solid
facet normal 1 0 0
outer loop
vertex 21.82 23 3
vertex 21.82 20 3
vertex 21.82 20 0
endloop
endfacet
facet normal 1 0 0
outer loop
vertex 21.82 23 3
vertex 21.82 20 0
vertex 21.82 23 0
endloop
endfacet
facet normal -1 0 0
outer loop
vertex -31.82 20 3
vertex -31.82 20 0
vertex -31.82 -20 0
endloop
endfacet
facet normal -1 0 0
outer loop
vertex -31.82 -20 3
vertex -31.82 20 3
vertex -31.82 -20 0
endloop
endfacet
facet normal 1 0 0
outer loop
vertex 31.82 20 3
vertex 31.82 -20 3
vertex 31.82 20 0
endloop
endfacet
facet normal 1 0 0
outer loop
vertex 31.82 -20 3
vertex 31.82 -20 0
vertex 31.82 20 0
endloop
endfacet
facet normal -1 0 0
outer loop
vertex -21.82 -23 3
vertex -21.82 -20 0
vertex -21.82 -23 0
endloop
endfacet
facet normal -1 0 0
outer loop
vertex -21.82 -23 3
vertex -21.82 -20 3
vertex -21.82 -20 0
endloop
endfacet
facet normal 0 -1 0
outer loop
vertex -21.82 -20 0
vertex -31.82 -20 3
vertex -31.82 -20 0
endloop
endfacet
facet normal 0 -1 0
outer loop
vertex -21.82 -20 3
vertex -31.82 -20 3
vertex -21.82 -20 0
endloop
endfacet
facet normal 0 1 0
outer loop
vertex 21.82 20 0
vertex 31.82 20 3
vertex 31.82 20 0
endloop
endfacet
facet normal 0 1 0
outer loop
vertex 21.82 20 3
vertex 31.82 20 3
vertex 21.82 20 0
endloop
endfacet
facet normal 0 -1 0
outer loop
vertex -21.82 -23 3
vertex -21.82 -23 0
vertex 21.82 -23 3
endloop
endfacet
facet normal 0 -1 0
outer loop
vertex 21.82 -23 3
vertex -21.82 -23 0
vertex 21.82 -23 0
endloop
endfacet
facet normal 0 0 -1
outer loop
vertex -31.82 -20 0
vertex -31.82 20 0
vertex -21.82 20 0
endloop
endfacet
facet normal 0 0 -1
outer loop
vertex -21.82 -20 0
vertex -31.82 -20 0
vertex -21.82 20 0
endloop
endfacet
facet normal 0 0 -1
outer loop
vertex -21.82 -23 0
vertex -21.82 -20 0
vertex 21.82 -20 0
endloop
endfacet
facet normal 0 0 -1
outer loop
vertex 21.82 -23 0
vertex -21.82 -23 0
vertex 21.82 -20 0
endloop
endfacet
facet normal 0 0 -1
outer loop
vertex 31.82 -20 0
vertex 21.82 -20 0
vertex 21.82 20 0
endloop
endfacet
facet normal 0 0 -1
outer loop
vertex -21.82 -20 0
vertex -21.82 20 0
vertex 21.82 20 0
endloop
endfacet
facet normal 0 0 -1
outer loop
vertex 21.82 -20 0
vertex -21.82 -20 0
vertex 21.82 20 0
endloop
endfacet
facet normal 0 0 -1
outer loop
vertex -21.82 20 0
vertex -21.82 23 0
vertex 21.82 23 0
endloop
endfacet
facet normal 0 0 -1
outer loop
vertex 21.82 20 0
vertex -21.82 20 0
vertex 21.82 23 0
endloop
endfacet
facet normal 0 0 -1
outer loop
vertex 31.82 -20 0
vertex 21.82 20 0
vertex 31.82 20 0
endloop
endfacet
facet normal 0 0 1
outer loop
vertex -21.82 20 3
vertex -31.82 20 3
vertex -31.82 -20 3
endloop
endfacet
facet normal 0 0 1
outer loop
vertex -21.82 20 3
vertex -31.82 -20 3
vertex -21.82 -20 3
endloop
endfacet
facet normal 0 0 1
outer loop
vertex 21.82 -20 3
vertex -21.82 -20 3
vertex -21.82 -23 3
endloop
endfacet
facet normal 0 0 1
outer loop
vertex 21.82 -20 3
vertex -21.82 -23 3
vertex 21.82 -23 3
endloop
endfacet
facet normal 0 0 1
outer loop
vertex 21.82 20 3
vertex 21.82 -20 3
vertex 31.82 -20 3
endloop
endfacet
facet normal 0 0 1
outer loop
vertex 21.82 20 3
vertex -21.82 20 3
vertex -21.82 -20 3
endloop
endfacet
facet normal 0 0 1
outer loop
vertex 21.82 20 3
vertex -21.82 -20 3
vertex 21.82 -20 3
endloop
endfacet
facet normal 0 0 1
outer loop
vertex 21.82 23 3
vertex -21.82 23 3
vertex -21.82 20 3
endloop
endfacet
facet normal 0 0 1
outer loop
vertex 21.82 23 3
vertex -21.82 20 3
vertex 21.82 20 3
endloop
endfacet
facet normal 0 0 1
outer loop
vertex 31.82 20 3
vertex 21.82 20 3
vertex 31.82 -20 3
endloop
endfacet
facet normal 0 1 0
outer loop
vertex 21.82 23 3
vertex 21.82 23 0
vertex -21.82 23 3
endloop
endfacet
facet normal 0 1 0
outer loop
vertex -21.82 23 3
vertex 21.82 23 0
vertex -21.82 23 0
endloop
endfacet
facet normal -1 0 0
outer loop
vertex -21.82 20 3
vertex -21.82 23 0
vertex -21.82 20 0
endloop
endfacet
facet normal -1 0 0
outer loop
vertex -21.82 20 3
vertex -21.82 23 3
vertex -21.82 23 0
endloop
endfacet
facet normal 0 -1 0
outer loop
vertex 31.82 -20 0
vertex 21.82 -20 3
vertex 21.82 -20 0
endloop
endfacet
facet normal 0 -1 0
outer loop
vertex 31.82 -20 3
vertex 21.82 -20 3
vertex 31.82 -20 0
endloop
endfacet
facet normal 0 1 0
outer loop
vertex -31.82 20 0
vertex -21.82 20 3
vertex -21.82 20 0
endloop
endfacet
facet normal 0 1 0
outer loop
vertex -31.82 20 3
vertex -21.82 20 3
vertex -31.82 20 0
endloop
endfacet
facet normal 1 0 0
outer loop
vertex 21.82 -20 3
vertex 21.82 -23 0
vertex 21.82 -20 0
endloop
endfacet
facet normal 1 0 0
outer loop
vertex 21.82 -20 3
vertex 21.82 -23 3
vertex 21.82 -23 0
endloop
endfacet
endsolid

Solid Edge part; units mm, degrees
sketch "Sketch1" plane through (0, 0, 0) normal (0, 0, 1) x (1, 0, 0)
  line L0 (-31.82, -23) -> (31.82, -23)
  line L1 (31.82, -23) -> (31.82, 23)
  line L2 (31.82, 23) -> (-31.82, 23)
  line L3 (-31.82, 23) -> (-31.82, -23)
  dimension "D1" = 46
  dimension "D2" = 63.64
extrude "Ajout_matière_1" add sketch "Sketch1" along normal blind 3
sketch "Sketch2" plane through (0, 0, 3) normal (0, 0, 1) x (1, 0, 0)
  line L0 (-31.82, 23) -> (-21.82, 23)
  line L1 (-21.82, 23) -> (-21.82, 20)
  line L2 (-21.82, 20) -> (-31.82, 20)
  line L3 (-31.82, 20) -> (-31.82, 23)
  dimension "D1" = 3
  dimension "D2" = 10
extrude "Cutout1" cut sketch "Sketch2" against normal through all
mirror "Mirror1" about plane through (0, 0, 0) normal (1, 0, 0) of "Cutout1"
mirror "Mirror2" about plane through (0, 0, 0) normal (0, -1, 0) of "Mirror1", "Cutout1"
properties material "Acier S235"
